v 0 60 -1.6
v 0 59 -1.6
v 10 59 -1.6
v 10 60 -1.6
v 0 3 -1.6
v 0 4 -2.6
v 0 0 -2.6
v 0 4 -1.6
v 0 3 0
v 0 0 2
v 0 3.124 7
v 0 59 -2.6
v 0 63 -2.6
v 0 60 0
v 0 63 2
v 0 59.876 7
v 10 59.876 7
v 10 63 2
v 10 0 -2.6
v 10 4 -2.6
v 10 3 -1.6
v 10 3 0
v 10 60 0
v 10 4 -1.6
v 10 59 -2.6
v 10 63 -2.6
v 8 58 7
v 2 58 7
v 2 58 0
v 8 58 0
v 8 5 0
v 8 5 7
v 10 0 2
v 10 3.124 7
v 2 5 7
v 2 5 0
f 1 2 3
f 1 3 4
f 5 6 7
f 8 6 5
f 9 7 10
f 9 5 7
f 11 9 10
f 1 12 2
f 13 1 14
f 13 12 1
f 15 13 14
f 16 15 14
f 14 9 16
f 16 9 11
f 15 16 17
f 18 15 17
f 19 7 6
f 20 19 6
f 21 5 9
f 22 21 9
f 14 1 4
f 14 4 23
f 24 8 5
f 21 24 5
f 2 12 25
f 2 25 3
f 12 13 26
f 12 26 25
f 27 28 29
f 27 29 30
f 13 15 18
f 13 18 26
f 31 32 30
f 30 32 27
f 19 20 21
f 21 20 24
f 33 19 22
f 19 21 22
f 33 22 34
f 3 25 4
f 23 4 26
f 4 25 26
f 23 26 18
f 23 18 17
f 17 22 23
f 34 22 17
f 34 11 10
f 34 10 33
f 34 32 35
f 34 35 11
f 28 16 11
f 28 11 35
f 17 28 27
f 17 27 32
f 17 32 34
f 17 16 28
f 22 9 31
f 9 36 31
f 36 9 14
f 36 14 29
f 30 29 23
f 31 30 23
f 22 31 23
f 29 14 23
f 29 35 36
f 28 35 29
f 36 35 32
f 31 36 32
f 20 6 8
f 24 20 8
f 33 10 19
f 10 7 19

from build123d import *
from OCP.BRepFilletAPI import BRepFilletAPI_MakeChamfer

# Parameters (mm, degrees)
SZKIC3_W                    = 10
SZKIC3_H                    = 63
DODANIE_WYCI_GNI_CIE1_DEPTH = 7
WYTNIJ_WYCI_GNI_CIE1_REACH  = 66.172
SZKIC4_W                    = 6
SZKIC4_H                    = 53
SFAZOWANIE1_SIZE            = 5
SFAZOWANIE1_SIZE2           = 3.12434676
DODANIE_WYCI_GNI_CIE2_DEPTH = 10


with BuildPart() as part:
    # Szkic3 → Dodanie-wyciągnięcie1 (new body)
    with BuildSketch(Plane.XY):
        with Locations((5, 31.5)):
            Rectangle(SZKIC3_W, SZKIC3_H)
    extrude(amount=DODANIE_WYCI_GNI_CIE1_DEPTH)

    # Szkic4 → Wytnij-wyciągnięcie1 (cut, up to next)
    with BuildSketch(Plane.XY.offset(7), mode=Mode.PRIVATE) as wytnij_wyci_gni_cie1_sk1:
        with Locations((5, 31.5)):
            Rectangle(SZKIC4_W, SZKIC4_H)
    wytnij_wyci_gni_cie1_tool1 = extrude(wytnij_wyci_gni_cie1_sk1.sketch, amount=-WYTNIJ_WYCI_GNI_CIE1_REACH, mode=Mode.PRIVATE) & part.part
    add(wytnij_wyci_gni_cie1_tool1.solids().sort_by_distance((5, 31.5, 7))[0], mode=Mode.SUBTRACT)

    # Sfazowanie1: one chamfer whose edges measure the first distance from different faces: ONE call of the kernel's chamfer builder (chamfer() names one face for all edges)
    sfazowanie1_edges_1 = [part.edges().sort_by_distance(p)[0] for p in [
        (5, 63, 7),
    ]]
    sfazowanie1_side_1 = [part.faces().sort_by_distance(p)[0] for p in [
        (5, 63, 3.5),
    ]]
    sfazowanie1_edges_2 = [part.edges().sort_by_distance(p)[0] for p in [
        (5, 0, 7),
    ]]
    sfazowanie1_side_2 = [part.faces().sort_by_distance(p)[0] for p in [
        (5, 0, 3.5),
    ]]
    sfazowanie1 = BRepFilletAPI_MakeChamfer(part.part.solid().wrapped)
    for e in sfazowanie1_edges_1:
        sfazowanie1.Add(SFAZOWANIE1_SIZE, SFAZOWANIE1_SIZE2, e.wrapped, sfazowanie1_side_1[0].wrapped)  # the first distance lies on this face
    for e in sfazowanie1_edges_2:
        sfazowanie1.Add(SFAZOWANIE1_SIZE, SFAZOWANIE1_SIZE2, e.wrapped, sfazowanie1_side_2[0].wrapped)  # the first distance lies on this face
    add(Compound.cast(sfazowanie1.Shape()), mode=Mode.REPLACE)

    # Szkic6 → Dodanie-wyciągnięcie2 (add)
    with BuildSketch(Plane.ZY):
        Polygon((0, 63), (-2.6, 63), (-2.6, 59), (-1.6, 59), (-1.6, 60), (0, 60), align=None)
        Polygon((0, 0), (-2.6, 0), (-2.6, 4), (-1.6, 4), (-1.6, 3), (0, 3), align=None)
    extrude(amount=-DODANIE_WYCI_GNI_CIE2_DEPTH)


solid = part.part
